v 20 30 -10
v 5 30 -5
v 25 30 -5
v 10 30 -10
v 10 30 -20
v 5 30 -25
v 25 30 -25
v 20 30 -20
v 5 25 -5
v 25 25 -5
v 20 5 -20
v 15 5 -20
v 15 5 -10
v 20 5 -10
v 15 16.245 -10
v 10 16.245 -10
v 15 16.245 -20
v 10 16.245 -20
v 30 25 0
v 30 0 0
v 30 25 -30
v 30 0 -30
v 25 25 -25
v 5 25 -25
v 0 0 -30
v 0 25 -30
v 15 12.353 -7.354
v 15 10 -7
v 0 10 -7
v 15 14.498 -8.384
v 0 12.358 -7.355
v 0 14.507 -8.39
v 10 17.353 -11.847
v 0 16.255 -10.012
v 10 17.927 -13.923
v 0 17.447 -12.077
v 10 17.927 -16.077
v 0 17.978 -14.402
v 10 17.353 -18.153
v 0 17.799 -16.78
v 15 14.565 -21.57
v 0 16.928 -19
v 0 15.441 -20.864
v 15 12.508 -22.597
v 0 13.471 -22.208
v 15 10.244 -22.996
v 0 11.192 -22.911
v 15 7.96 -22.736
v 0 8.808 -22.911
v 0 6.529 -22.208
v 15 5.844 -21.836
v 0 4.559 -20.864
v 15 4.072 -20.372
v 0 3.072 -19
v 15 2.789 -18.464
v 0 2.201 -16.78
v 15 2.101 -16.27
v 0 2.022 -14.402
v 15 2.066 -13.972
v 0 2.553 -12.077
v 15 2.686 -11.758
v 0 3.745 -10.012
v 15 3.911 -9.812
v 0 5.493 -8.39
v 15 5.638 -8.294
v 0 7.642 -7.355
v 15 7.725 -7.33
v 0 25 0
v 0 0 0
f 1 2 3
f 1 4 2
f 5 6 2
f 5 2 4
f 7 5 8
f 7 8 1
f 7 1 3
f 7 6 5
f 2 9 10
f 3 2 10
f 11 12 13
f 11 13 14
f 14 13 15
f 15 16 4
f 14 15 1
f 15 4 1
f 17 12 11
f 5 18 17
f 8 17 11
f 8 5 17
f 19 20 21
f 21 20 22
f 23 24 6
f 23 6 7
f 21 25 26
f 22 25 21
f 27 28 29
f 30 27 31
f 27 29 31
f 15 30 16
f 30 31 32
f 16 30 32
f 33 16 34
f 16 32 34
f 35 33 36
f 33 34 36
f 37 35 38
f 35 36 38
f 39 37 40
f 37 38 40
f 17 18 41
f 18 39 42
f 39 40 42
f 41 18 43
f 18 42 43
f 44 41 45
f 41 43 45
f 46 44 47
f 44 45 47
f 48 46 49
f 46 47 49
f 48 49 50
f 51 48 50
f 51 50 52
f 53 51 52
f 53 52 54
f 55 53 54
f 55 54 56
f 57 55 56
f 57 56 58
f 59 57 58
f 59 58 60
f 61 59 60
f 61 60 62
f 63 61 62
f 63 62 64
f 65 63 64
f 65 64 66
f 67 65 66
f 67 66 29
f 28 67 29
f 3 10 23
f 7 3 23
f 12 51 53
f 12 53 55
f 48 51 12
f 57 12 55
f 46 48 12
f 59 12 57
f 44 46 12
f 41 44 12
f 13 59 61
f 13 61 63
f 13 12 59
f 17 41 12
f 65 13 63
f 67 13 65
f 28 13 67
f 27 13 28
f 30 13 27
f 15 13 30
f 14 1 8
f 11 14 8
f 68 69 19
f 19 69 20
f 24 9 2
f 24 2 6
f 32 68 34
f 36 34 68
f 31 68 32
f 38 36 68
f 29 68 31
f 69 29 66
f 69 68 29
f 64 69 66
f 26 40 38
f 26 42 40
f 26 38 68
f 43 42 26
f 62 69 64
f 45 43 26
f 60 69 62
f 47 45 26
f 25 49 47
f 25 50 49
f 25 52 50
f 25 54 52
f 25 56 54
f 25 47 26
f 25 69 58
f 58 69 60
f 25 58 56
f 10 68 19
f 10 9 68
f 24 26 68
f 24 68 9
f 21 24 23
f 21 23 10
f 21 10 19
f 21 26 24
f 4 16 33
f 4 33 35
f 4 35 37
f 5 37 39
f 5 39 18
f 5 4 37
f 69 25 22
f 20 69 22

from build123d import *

# Parameters (mm, degrees)
SKETCH1_W           = 30
SKETCH1_H           = 30
BOSS_EXTRUDE1_DEPTH = 25
SKETCH3_W           = 10
SKETCH3_H           = 10
CUT_EXTRUDE1_DEPTH  = 20
SKETCH4_R           = 8
CUT_EXTRUDE2_DEPTH  = 15
SKETCH5_W           = 20
SKETCH5_H           = 20
BOSS_EXTRUDE2_DEPTH = 5
SKETCH6_W           = 10
SKETCH6_H           = 10
CUT_EXTRUDE3_DEPTH  = 15


with BuildPart() as part:
    # Sketch1 → Boss-Extrude1 (new body)
    with BuildSketch(Plane(origin=(0, 0, 0), x_dir=(1, 0, 0), z_dir=(0, 1, 0))):
        with Locations((15, 15)):
            Rectangle(SKETCH1_W, SKETCH1_H)
    extrude(amount=BOSS_EXTRUDE1_DEPTH)

    # Sketch3 → Cut-Extrude1 (cut)
    with BuildSketch(Plane(origin=(0, 25, 0), x_dir=(1, 0, 0), z_dir=(0, 1, 0))):
        with Locations((15, 15)):
            Rectangle(SKETCH3_W, SKETCH3_H)
    extrude(amount=-CUT_EXTRUDE1_DEPTH, mode=Mode.SUBTRACT)

    # Sketch4 → Cut-Extrude2 (cut)
    with BuildSketch(Plane.ZY):
        with Locations((-15, 10)):
            Circle(SKETCH4_R)
    extrude(amount=-CUT_EXTRUDE2_DEPTH, mode=Mode.SUBTRACT)

    # Sketch5 → Boss-Extrude2 (add)
    with BuildSketch(Plane(origin=(0, 25, 0), x_dir=(1, 0, 0), z_dir=(0, 1, 0))):
        with Locations((15, 15)):
            Rectangle(SKETCH5_W, SKETCH5_H)
    extrude(amount=BOSS_EXTRUDE2_DEPTH)

    # Sketch6 → Cut-Extrude3 (cut)
    with BuildSketch(Plane(origin=(0, 30, 0), x_dir=(1, 0, 0), z_dir=(0, 1, 0))):
        with Locations((15, 15)):
            Rectangle(SKETCH6_W, SKETCH6_H)
    extrude(amount=-CUT_EXTRUDE3_DEPTH, mode=Mode.SUBTRACT)


solid = part.part
